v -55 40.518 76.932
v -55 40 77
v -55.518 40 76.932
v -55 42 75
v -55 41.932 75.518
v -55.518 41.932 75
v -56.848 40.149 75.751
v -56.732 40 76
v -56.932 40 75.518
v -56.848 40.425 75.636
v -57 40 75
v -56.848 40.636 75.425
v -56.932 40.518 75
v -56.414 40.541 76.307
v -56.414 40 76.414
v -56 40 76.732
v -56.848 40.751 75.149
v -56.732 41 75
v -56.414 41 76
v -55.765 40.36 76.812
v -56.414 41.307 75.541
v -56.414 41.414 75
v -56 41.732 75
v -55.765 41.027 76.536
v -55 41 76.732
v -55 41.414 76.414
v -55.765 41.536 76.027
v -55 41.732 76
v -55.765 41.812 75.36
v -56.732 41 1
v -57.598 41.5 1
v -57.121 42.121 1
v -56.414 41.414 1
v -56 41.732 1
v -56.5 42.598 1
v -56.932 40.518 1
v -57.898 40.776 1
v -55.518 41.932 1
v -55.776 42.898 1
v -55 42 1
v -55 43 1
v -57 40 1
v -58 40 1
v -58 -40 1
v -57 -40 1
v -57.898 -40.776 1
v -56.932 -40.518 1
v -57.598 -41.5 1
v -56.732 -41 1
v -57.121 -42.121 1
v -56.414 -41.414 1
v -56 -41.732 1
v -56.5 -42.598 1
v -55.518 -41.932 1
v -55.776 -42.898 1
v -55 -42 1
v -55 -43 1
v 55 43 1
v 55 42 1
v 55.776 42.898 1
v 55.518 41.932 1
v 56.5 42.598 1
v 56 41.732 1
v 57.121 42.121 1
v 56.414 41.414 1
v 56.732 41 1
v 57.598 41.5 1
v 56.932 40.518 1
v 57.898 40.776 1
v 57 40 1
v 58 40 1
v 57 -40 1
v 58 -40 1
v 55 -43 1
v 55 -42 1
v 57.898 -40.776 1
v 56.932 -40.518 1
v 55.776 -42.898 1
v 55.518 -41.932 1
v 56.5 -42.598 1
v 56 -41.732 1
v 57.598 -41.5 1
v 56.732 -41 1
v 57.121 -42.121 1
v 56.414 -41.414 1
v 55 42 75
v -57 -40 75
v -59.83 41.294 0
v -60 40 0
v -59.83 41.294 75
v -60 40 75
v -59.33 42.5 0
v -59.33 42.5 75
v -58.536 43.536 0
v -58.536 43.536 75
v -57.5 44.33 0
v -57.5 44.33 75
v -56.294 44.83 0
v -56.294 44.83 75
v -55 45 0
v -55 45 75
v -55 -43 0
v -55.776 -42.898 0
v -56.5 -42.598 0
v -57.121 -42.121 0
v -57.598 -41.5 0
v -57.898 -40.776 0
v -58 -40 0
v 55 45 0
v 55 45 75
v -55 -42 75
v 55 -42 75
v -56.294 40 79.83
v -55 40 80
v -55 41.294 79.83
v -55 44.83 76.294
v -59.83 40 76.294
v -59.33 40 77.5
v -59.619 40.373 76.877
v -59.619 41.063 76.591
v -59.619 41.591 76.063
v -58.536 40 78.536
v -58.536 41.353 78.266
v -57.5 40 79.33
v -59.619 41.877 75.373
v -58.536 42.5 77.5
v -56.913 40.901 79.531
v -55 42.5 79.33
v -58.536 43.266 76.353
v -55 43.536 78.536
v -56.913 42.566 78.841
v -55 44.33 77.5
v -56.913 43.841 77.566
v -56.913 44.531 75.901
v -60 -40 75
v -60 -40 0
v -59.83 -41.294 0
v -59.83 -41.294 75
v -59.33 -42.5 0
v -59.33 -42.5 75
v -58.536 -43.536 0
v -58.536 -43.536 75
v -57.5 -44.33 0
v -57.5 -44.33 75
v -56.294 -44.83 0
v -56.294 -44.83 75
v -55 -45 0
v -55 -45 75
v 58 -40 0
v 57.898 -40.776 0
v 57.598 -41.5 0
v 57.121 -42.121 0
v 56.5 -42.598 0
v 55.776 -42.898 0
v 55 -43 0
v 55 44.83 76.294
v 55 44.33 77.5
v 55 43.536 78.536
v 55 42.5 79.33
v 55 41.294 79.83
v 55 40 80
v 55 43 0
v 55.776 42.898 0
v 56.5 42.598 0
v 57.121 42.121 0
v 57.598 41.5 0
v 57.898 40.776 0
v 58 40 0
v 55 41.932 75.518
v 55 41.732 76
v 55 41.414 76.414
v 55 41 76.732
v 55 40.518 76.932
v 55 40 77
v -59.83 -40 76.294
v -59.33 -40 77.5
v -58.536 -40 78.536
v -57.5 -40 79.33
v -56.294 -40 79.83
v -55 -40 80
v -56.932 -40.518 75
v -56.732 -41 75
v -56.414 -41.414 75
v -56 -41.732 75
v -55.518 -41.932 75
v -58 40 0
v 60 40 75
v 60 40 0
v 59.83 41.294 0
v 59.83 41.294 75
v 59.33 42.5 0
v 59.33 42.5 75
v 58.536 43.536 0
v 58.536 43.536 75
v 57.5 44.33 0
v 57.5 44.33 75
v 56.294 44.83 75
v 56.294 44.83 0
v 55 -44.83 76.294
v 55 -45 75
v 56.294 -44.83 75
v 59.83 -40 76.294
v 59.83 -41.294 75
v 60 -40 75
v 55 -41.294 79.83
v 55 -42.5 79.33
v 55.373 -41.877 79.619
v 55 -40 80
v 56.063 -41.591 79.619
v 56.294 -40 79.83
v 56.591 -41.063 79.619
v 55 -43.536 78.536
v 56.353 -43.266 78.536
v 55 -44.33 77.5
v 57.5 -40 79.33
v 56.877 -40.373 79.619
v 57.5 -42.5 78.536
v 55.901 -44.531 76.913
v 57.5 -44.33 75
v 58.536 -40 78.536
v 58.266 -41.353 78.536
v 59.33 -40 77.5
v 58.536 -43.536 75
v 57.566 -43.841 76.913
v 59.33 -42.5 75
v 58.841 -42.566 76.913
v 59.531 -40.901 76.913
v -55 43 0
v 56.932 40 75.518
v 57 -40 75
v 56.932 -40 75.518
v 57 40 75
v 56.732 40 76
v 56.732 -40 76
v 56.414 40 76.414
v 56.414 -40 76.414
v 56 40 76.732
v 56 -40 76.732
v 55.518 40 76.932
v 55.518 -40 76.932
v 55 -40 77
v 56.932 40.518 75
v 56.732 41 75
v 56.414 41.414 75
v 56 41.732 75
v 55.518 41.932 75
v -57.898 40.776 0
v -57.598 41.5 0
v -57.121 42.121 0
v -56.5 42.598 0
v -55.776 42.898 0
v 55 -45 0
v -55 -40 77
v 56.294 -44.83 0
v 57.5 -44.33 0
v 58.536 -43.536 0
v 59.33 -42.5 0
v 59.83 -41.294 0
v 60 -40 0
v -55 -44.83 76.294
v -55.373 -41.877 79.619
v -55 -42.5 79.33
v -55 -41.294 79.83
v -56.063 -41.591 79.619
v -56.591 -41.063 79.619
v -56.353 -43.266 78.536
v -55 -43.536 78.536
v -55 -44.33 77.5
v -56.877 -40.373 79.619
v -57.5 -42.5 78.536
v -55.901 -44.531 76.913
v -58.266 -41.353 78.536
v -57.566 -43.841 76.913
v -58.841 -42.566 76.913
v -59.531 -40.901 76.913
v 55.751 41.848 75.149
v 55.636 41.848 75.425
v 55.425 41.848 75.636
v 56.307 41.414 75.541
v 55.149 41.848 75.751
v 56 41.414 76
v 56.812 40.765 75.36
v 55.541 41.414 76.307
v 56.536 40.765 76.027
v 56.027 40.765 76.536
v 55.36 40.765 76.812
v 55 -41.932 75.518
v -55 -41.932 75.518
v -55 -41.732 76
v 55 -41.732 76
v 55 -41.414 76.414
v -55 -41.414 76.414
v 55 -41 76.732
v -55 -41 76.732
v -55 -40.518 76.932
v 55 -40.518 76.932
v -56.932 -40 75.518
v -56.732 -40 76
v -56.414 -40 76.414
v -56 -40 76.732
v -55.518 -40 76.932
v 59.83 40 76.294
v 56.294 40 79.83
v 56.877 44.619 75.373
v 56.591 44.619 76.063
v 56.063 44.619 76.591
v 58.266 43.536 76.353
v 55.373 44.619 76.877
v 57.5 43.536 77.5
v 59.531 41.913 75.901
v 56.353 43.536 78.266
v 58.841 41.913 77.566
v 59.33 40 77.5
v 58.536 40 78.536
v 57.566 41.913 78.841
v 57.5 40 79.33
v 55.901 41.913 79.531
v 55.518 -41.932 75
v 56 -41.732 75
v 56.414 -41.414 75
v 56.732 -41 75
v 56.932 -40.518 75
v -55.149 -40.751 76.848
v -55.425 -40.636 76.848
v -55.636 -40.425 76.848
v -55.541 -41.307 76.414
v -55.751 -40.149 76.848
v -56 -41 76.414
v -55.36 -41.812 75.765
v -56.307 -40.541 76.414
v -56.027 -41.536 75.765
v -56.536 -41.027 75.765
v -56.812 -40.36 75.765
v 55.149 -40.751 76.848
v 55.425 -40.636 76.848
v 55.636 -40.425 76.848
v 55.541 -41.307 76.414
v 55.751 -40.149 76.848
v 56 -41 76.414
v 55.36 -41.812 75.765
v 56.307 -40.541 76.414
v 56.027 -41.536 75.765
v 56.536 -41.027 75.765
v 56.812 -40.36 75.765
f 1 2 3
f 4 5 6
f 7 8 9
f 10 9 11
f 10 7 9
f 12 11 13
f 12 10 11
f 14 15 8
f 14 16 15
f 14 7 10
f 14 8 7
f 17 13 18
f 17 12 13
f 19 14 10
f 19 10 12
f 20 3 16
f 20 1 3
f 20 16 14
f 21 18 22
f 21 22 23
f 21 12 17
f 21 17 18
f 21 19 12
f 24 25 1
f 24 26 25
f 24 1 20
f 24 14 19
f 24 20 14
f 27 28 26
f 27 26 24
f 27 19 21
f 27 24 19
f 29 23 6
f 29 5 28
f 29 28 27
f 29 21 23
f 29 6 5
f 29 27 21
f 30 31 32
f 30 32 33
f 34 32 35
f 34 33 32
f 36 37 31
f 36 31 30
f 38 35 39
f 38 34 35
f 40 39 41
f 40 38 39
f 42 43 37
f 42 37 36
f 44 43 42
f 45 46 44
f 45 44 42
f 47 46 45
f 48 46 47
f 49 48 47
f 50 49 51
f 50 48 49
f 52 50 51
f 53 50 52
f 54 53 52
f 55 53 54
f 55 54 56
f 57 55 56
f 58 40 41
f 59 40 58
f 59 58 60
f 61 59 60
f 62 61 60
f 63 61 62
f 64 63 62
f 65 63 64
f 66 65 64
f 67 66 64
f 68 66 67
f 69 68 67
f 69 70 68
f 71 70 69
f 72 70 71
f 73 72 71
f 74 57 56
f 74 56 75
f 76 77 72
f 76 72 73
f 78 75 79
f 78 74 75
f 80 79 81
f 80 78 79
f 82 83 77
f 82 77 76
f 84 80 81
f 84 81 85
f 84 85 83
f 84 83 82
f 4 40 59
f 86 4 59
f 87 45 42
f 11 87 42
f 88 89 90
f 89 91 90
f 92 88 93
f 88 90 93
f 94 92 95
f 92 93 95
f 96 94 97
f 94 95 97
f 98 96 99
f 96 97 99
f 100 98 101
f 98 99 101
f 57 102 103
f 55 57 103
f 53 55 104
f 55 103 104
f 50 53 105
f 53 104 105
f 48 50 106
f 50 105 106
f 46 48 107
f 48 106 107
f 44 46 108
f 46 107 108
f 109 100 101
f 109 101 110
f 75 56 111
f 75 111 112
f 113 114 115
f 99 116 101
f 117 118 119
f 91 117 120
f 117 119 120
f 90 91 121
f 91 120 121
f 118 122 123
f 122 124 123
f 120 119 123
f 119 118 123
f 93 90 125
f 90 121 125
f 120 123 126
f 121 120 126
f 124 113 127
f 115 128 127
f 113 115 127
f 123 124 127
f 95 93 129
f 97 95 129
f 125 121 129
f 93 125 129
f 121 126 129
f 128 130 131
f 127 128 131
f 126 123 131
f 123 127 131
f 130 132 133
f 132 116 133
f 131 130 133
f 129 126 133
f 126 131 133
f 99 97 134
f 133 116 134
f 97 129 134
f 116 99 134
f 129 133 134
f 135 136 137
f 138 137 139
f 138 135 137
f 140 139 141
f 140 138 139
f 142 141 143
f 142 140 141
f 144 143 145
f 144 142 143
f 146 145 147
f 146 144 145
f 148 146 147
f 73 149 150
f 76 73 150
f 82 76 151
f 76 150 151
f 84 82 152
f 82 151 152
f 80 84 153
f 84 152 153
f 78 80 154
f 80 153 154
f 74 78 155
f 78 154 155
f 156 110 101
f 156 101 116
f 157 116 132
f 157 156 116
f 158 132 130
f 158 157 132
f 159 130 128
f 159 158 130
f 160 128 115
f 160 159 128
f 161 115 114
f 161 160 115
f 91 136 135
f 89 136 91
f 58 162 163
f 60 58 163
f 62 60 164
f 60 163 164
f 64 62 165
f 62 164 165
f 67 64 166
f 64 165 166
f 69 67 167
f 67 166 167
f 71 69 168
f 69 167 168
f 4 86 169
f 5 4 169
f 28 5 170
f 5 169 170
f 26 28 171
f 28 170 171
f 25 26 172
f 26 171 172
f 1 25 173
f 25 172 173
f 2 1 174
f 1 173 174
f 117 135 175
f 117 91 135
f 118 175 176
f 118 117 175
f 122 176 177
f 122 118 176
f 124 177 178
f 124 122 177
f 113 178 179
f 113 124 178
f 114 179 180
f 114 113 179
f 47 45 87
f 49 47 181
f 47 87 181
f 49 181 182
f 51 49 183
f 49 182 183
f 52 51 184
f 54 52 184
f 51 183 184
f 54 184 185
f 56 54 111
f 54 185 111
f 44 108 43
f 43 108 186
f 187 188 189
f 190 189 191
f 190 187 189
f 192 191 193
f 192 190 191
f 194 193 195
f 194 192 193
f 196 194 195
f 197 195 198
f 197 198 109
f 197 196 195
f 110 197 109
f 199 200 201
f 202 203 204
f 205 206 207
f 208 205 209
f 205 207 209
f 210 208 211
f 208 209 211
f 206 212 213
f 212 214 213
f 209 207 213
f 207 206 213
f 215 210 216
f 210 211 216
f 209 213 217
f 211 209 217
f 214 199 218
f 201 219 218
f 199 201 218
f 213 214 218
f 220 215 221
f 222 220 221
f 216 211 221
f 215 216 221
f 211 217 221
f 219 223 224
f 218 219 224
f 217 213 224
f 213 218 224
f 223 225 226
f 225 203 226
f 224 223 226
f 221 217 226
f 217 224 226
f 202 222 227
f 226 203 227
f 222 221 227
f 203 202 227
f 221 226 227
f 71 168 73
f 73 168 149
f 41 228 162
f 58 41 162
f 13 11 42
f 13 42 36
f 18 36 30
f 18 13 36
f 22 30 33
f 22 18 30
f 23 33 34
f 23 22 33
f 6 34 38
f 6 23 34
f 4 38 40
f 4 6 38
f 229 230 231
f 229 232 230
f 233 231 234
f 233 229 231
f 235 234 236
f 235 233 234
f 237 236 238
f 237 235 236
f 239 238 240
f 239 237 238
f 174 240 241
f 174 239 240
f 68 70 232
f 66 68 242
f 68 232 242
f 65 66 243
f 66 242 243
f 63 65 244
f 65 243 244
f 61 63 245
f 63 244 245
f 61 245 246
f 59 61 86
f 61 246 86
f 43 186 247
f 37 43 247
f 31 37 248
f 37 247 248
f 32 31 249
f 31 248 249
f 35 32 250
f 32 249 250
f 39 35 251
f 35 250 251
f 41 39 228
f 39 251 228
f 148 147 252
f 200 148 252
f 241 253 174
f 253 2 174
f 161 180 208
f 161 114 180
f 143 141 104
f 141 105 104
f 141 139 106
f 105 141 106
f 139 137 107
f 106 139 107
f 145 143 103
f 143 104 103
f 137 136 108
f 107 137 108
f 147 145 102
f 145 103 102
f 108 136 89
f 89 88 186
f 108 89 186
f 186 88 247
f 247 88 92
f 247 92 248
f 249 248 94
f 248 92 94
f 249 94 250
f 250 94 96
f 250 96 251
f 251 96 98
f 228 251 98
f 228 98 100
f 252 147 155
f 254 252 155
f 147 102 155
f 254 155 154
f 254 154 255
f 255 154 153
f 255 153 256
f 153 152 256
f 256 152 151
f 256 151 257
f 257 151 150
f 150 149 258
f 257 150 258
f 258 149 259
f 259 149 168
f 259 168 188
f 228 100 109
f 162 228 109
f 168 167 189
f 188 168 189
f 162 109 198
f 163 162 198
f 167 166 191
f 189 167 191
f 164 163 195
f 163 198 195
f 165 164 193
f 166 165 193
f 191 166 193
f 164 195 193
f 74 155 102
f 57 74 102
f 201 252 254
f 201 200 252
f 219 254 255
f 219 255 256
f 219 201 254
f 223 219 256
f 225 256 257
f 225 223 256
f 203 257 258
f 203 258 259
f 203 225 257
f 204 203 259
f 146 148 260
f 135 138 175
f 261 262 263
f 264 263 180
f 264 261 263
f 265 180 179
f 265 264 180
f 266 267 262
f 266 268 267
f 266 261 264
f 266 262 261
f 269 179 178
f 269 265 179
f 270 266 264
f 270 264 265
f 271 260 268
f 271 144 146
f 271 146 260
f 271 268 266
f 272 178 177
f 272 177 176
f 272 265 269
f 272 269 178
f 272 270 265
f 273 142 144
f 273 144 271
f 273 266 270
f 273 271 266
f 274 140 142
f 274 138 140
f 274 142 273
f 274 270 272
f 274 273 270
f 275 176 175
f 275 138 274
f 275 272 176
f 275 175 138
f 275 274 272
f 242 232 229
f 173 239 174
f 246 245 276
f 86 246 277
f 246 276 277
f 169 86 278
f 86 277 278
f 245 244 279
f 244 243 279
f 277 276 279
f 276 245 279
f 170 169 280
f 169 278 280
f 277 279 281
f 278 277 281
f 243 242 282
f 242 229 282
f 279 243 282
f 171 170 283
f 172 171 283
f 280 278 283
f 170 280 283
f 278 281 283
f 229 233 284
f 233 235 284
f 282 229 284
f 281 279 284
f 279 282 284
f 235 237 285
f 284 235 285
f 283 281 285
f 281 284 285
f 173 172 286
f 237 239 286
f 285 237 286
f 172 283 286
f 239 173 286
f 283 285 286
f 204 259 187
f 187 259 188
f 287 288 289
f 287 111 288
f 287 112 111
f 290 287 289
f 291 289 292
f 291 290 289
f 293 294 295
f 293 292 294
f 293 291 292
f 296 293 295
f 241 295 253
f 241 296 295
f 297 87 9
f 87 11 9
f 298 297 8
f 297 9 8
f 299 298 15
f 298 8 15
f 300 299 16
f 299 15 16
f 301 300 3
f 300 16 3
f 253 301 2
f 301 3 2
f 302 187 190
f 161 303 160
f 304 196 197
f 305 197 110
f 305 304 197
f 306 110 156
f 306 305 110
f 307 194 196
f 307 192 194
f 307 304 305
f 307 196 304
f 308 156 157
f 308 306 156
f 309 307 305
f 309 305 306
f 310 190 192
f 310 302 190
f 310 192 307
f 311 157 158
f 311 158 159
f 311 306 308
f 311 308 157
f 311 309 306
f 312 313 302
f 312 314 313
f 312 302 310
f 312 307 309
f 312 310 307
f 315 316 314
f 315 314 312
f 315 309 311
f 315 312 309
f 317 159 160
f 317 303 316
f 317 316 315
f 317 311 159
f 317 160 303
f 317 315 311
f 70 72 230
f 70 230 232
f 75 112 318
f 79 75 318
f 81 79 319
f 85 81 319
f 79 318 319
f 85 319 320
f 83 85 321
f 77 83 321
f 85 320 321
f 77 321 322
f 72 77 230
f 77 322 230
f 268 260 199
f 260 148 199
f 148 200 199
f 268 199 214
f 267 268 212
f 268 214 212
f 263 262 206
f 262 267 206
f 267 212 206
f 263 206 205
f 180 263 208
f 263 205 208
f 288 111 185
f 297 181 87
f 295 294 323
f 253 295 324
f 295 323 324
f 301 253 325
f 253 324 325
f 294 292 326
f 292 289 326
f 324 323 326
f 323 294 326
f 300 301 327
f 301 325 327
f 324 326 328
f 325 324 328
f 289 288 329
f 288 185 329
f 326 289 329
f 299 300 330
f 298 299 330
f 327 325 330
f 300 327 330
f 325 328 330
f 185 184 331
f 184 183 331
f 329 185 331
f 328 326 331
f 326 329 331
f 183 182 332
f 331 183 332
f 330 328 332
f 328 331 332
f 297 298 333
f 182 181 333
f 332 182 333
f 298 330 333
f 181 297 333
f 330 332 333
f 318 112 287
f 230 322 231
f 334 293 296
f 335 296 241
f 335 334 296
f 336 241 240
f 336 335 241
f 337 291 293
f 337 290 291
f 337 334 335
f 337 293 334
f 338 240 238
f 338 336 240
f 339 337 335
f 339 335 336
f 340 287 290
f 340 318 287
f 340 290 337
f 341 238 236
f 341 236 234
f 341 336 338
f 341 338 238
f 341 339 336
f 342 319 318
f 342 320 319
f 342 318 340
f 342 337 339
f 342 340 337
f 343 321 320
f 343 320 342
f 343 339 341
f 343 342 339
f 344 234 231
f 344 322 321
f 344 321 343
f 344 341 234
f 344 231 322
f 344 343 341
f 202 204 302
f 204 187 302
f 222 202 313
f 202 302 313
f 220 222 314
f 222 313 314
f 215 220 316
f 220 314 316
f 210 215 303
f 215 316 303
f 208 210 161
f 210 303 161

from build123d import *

# Parameters (mm, degrees)
F0_W     = 120
F0_H     = 90
F1_DEPTH = 80
F2_R     = 5
F3_T     = -3
F5_DEPTH = 1


with BuildPart() as f1:
    # F0 (on Top) → F1 (new body)
    with BuildSketch(Plane.XY):
        Rectangle(F0_W, F0_H)
    extrude(amount=F1_DEPTH)

    # F2
    f2_edges = [f1.edges().sort_by_distance(p)[0] for p in [
        (60, -45, 40),
        (-60, -45, 40),
        (0, -45, 80),
        (60, 0, 80),
        (60, 45, 40),
        (0, 45, 80),
        (-60, 0, 80),
        (-60, 45, 40),
    ]]
    fillet(f2_edges, radius=F2_R)

    # F3
    f3_openings = [f1.faces().sort_by_distance(p)[0] for p in [
        (0, 0, 0),
    ]]
    offset(amount=F3_T, openings=f3_openings)

    # F4 (on face) → F5 (cut)
    with BuildSketch(Plane(origin=(0, 0, 0), x_dir=(1, 0, 0), z_dir=(0, 0, -1))):
        with BuildLine():
            ThreePointArc((58, 40), (57.12132, 42.12132), (55, 43))
            Line((55, 43), (-55, 43))
            ThreePointArc((-55, 43), (-57.12132, 42.12132), (-58, 40))
            Line((-58, 40), (-58, -40))
            ThreePointArc((-58, -40), (-57.12132, -42.12132), (-55, -43))
            Line((-55, -43), (55, -43))
            ThreePointArc((55, -43), (57.12132, -42.12132), (58, -40))
            Line((58, -40), (58, 40))
        make_face()
    extrude(amount=-F5_DEPTH, mode=Mode.SUBTRACT)


solid = f1.part
